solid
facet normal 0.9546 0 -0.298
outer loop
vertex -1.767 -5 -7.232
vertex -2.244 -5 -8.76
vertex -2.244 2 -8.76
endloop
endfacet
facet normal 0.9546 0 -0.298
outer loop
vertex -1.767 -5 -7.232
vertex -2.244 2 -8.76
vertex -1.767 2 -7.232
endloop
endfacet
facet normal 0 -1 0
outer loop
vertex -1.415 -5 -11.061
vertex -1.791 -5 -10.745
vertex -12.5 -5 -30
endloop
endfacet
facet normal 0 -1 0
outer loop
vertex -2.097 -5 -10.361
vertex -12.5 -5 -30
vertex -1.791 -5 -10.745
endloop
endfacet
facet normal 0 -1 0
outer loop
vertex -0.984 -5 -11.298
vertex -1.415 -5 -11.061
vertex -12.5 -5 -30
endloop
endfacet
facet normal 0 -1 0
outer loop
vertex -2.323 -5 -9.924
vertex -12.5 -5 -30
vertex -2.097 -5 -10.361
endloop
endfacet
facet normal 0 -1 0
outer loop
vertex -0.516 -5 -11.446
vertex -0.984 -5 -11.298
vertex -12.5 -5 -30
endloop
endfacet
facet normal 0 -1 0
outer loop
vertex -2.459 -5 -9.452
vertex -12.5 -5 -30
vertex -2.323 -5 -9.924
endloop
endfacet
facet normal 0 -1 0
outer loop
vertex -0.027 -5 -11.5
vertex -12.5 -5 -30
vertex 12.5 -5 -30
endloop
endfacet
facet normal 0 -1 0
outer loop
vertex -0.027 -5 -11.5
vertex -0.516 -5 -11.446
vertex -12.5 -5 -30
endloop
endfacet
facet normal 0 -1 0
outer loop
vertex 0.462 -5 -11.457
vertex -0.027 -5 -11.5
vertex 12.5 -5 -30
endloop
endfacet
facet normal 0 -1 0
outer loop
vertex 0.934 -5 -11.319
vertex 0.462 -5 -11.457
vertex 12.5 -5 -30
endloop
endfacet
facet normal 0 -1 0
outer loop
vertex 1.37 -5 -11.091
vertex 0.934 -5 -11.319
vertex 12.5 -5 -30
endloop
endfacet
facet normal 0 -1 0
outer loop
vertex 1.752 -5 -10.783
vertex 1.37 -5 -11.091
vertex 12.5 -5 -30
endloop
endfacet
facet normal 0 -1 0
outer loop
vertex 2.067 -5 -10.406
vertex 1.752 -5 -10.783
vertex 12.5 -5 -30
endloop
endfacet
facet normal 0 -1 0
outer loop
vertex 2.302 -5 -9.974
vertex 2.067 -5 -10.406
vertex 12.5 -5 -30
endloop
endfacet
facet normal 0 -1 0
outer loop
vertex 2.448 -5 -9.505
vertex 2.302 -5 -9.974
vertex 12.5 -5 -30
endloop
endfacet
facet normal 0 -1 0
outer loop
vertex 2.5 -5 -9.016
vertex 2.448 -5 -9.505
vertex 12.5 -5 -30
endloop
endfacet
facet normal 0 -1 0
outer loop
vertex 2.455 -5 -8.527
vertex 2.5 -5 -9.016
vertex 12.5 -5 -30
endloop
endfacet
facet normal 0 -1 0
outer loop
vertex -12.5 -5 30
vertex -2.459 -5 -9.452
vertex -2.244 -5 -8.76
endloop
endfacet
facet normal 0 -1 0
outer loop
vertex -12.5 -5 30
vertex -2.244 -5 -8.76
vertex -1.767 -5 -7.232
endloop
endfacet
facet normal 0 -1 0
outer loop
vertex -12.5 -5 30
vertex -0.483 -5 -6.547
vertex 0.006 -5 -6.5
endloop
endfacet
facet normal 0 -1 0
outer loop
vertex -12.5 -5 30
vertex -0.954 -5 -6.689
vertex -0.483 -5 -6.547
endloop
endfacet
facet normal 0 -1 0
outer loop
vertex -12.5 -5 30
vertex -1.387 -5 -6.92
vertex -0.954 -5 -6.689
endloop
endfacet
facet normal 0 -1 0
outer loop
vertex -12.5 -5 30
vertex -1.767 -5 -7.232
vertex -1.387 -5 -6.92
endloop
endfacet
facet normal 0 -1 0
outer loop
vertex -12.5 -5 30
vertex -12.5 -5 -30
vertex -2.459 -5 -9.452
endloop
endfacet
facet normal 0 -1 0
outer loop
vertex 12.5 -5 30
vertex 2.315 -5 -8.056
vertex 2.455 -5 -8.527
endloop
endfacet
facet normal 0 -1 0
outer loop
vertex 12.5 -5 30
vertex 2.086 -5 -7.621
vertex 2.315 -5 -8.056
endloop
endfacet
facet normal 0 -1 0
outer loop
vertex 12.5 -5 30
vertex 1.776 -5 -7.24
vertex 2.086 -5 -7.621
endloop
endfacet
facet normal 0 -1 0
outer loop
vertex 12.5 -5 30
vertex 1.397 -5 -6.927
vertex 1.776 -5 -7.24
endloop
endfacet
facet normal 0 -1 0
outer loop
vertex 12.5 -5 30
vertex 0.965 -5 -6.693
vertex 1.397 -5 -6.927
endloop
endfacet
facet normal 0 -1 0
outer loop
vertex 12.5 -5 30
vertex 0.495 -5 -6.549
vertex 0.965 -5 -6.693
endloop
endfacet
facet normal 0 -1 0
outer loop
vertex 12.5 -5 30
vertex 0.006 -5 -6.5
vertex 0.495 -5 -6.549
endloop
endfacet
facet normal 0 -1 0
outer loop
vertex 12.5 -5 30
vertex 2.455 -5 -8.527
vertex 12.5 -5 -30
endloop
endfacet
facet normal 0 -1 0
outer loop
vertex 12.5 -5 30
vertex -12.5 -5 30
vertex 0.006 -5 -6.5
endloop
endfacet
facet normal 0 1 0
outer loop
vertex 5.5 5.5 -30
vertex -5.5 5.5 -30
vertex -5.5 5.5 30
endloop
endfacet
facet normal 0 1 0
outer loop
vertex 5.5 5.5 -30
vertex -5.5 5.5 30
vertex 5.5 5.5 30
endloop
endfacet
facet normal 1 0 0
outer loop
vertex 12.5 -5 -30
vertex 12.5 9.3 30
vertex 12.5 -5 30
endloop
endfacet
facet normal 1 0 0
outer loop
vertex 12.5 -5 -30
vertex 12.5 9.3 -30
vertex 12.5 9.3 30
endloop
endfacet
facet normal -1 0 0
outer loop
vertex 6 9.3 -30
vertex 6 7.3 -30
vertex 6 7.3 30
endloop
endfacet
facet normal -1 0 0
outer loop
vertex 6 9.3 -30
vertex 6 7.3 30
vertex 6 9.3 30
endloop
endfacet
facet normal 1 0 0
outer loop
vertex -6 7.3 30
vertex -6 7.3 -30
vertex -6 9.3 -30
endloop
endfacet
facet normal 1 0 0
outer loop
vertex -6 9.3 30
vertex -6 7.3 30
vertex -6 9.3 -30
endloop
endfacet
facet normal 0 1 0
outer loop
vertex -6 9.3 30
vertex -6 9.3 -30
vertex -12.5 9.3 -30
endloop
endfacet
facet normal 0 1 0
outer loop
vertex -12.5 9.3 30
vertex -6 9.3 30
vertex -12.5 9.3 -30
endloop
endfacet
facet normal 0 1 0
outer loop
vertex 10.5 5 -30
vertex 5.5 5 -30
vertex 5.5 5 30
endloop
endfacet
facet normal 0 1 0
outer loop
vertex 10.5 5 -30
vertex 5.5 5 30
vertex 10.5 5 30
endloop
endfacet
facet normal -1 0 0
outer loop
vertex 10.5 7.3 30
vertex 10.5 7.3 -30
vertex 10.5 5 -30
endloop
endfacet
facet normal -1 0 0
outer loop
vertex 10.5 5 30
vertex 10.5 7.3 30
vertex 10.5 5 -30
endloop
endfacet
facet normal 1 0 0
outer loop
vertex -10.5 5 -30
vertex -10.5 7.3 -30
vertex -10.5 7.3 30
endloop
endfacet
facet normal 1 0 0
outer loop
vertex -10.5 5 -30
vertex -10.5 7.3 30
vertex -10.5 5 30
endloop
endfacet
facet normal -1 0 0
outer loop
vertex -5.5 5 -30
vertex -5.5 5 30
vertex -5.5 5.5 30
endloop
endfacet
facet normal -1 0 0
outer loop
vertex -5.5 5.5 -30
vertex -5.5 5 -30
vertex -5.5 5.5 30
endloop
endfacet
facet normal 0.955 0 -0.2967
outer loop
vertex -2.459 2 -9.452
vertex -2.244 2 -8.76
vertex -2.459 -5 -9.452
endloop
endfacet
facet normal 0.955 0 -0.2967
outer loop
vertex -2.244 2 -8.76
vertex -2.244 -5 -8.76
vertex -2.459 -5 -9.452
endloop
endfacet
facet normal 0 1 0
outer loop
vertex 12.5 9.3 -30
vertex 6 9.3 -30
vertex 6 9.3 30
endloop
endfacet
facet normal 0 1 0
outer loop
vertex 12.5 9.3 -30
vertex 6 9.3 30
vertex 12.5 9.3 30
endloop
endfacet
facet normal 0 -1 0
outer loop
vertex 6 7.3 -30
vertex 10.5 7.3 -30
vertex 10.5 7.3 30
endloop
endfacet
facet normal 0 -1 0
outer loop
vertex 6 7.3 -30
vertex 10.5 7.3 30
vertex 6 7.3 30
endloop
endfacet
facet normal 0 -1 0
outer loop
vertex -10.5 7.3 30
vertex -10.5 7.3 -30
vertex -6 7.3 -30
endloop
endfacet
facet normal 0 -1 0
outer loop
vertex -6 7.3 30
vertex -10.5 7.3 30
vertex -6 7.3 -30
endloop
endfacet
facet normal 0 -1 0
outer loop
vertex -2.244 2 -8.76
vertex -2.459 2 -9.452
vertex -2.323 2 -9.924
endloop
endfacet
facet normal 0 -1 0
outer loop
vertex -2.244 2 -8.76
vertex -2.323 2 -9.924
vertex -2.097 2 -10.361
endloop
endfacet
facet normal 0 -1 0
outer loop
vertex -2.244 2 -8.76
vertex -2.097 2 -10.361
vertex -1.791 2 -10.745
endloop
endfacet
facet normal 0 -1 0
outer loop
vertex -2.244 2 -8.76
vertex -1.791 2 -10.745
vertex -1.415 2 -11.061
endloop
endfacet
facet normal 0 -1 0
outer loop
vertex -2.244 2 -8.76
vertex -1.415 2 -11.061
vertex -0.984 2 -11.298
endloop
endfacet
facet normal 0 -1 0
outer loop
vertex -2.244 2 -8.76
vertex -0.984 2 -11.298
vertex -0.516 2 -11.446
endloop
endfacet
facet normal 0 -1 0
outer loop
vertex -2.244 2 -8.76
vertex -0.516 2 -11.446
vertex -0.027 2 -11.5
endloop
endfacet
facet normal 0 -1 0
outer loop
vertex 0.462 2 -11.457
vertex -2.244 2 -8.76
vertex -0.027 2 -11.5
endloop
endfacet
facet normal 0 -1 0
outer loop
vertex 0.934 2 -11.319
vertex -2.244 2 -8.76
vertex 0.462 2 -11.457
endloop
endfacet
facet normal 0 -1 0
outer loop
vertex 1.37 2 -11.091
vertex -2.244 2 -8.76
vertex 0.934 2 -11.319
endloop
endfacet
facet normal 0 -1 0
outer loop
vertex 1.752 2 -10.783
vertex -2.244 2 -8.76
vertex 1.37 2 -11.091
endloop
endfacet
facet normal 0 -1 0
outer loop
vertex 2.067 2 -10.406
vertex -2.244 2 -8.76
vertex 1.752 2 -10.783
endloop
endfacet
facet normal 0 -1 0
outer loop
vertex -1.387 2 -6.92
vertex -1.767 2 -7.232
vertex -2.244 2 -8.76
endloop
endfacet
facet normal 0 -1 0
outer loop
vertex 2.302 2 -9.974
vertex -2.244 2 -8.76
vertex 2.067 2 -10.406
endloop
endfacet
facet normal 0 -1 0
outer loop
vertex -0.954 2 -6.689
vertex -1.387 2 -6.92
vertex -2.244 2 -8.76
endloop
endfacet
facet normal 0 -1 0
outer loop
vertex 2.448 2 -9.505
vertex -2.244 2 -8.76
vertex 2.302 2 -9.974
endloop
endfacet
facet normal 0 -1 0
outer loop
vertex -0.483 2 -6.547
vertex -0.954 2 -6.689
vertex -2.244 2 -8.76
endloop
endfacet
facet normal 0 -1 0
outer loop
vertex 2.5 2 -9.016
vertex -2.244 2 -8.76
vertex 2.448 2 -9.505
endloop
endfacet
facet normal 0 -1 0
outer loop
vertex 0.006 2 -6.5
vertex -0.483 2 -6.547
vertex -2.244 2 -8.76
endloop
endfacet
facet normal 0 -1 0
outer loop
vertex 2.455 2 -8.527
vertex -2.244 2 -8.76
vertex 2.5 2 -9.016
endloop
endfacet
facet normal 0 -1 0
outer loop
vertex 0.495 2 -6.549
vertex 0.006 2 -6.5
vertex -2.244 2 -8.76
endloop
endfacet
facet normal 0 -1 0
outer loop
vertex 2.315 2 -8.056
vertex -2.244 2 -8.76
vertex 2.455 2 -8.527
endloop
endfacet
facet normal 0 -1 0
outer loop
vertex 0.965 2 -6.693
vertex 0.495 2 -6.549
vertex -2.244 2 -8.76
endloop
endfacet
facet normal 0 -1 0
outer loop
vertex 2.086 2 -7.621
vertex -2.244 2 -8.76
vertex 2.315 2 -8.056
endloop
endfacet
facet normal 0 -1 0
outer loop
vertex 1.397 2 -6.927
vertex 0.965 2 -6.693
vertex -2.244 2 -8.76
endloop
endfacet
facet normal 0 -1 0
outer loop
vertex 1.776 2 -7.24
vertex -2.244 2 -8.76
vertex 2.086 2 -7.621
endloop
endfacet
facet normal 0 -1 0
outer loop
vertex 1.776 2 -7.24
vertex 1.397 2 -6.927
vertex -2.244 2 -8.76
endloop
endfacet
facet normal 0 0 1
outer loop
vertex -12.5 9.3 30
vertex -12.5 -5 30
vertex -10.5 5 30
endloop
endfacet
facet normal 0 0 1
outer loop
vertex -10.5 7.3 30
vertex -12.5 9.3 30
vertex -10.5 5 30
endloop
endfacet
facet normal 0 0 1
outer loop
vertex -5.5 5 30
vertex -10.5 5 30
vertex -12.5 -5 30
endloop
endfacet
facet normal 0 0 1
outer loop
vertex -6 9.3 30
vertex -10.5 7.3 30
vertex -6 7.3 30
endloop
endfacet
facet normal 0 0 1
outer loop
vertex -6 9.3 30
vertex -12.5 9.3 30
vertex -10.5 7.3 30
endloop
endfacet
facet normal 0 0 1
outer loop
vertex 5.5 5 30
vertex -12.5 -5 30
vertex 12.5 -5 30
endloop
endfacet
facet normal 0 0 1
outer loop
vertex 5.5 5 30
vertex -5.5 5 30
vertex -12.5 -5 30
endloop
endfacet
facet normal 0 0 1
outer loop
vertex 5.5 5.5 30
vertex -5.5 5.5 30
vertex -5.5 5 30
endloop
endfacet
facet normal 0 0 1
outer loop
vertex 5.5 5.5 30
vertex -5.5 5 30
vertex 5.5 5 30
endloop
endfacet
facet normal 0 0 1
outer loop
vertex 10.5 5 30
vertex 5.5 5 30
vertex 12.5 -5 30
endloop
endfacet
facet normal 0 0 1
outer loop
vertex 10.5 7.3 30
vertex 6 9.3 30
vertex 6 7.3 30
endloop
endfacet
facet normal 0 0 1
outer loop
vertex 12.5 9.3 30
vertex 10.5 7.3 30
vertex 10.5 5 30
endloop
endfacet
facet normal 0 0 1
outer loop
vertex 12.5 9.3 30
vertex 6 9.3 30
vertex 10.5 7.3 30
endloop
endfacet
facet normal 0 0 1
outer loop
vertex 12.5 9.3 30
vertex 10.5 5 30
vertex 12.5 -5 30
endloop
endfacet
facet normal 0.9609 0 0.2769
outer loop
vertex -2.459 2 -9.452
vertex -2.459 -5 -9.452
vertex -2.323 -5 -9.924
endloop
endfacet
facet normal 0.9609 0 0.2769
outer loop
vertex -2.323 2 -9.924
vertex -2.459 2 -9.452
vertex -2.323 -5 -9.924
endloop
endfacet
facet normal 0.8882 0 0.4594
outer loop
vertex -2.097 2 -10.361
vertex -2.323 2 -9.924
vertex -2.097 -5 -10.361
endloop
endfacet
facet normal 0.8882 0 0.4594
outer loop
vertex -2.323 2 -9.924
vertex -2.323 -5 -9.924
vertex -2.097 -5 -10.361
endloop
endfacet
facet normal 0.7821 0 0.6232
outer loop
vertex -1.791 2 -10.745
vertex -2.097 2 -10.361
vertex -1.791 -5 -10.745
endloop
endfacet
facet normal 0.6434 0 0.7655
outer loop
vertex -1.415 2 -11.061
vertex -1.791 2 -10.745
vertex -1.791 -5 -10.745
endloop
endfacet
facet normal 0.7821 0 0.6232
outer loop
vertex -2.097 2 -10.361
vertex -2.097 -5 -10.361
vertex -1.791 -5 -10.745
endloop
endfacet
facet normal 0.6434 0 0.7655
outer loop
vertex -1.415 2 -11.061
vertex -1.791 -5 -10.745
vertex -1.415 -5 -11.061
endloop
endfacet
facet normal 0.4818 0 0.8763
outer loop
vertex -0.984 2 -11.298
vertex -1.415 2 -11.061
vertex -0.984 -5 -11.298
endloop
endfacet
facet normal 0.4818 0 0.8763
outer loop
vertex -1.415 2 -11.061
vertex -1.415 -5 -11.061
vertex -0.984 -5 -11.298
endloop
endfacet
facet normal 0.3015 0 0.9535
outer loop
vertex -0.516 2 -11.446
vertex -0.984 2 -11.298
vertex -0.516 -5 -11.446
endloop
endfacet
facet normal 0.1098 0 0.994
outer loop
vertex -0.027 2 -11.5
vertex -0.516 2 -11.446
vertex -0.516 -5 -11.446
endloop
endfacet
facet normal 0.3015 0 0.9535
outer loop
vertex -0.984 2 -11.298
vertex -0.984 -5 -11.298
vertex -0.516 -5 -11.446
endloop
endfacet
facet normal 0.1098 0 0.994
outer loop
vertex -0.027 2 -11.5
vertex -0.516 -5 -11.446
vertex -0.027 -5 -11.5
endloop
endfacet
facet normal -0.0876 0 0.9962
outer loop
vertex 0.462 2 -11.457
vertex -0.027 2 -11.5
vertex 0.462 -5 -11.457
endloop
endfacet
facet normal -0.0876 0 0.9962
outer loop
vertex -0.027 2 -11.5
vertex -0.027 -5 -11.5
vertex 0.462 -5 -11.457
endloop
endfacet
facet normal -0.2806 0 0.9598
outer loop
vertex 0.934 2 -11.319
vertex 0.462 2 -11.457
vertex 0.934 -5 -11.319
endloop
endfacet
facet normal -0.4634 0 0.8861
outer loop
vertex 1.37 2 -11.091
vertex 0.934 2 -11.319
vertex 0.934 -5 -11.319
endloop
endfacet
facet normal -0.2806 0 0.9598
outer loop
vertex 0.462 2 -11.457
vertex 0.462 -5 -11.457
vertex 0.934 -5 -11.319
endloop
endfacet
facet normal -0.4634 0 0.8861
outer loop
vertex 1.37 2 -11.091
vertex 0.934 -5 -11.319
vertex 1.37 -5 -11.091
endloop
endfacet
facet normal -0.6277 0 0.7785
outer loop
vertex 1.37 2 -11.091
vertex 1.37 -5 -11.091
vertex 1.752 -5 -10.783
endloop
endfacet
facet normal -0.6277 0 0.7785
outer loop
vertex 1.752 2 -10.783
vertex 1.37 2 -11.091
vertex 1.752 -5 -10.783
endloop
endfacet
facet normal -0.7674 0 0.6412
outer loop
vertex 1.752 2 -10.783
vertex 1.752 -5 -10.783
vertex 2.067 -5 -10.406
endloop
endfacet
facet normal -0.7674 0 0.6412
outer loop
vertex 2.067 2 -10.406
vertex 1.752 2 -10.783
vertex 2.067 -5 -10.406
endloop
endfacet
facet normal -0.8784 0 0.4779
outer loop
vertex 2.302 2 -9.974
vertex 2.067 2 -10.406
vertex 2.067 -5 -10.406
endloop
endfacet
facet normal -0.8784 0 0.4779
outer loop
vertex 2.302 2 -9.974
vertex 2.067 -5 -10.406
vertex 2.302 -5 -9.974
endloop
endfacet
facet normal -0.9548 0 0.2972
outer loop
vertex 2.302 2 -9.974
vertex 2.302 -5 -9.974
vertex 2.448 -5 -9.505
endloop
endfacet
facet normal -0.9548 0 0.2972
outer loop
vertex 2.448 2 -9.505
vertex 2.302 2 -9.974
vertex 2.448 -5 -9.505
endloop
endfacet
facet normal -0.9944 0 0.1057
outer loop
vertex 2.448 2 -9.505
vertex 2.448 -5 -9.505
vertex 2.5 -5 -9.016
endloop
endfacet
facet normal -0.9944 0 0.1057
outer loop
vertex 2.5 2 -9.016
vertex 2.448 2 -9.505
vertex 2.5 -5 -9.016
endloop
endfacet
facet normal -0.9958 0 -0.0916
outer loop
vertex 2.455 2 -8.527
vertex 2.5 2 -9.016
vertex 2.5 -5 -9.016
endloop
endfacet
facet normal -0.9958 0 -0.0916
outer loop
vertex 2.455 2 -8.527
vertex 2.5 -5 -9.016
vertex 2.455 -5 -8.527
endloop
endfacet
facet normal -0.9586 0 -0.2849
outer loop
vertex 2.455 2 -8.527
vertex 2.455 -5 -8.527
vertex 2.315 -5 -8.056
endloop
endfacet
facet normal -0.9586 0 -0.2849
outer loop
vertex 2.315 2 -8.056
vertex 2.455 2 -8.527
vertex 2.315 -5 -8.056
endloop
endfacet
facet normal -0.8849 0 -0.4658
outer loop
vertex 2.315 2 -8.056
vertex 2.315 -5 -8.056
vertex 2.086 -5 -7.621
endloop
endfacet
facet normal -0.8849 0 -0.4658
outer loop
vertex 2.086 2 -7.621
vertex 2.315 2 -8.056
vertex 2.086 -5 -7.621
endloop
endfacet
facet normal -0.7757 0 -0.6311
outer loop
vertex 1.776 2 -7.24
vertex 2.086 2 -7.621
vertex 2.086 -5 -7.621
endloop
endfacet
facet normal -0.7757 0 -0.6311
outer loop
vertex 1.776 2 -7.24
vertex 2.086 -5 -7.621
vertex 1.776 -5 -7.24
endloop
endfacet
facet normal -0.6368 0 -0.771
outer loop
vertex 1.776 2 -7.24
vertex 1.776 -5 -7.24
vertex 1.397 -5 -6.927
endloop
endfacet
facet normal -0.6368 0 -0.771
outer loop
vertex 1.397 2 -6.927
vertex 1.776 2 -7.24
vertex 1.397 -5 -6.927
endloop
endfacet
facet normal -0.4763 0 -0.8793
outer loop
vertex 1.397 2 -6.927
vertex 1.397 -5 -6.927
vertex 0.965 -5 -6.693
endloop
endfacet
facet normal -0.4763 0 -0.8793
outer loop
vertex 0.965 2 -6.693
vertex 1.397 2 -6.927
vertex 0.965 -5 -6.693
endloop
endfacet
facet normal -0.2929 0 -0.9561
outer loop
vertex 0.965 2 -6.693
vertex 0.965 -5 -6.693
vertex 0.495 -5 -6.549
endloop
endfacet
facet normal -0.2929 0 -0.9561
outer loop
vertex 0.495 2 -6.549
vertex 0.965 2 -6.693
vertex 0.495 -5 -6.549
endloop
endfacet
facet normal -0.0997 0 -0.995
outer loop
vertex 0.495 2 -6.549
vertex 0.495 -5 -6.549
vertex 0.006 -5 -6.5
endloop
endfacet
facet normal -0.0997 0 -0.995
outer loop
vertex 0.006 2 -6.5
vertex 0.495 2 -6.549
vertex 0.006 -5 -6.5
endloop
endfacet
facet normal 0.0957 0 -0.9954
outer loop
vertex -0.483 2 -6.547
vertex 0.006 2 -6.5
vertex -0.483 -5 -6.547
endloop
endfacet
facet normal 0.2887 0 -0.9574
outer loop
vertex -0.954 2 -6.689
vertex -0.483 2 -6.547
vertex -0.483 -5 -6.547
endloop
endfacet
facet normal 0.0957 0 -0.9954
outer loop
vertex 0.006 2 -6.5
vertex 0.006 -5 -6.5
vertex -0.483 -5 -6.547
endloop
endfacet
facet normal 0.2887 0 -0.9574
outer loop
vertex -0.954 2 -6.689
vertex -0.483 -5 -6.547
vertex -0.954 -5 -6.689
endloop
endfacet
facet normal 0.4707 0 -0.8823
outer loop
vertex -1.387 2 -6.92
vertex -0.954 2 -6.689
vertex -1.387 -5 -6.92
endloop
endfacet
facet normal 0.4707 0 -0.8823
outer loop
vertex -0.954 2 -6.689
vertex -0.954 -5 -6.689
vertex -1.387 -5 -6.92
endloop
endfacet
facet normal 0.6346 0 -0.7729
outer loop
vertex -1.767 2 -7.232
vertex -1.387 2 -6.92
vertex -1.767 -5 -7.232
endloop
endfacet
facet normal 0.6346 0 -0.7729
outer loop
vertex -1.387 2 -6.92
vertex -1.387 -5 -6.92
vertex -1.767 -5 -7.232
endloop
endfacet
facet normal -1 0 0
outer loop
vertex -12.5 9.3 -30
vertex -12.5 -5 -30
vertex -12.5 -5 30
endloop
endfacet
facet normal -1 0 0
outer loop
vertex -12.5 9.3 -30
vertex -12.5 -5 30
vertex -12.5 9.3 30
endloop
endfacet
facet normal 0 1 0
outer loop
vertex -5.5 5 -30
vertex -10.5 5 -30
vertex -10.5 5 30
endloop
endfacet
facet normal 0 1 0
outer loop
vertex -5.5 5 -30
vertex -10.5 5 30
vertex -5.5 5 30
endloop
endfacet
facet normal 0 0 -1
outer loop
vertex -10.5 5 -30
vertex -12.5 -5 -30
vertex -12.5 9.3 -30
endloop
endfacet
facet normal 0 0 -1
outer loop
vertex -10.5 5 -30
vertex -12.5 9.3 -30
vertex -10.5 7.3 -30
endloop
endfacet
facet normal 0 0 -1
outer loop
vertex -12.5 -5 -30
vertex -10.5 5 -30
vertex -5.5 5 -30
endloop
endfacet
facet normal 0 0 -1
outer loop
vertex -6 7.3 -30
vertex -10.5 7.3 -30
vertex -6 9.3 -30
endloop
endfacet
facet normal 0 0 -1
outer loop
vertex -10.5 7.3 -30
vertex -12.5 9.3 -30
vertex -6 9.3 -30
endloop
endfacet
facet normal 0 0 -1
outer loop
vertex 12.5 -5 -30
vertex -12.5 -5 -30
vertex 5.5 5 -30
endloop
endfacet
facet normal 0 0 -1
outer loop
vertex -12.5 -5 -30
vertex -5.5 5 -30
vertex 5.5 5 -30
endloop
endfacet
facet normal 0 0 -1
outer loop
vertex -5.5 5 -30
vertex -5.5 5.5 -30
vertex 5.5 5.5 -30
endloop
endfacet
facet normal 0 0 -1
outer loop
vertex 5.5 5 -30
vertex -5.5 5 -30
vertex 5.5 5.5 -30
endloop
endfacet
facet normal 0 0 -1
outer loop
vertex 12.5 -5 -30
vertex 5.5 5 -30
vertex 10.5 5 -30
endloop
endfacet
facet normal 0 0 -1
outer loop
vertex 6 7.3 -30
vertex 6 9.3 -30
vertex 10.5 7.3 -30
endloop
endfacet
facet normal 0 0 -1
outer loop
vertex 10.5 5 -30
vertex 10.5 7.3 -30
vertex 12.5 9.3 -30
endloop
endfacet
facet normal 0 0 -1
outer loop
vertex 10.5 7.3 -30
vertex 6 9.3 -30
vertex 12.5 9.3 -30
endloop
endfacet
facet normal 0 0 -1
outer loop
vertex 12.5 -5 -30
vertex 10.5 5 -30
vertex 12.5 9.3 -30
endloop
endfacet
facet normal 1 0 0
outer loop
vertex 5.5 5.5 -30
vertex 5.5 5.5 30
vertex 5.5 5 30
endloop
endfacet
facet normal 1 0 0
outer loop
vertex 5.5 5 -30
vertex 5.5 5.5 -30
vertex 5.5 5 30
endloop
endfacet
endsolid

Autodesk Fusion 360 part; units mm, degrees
sketch "Sketch1" plane through (0, 0, 0) normal (0, 0, 1) x (1, 0, 0)
  line L0 (12.5, -5) -> (-12.5, -5)
  line L1 (-12.5, -5) -> (-12.5, 5)
  line L2 (12.5, 5) -> (12.5, -5)
  line L3 (12.5, -5) -> (-12.5, 5) construction
  line L4 (-12.5, -5) -> (12.5, 5) construction
  line L5 (12.5, 5) -> (12.5, 7.3)
  line L6 (10.5, 7.3) -> (10.5, 5)
  line L7 (-5.5, 5.5) -> (5.5, 5.5)
  line L8 (5.5, 5.5) -> (5.5, 5)
  line L9 (-5.5, 5) -> (-5.5, 5.5)
  line L10 (6, 9.3) -> (12.5, 9.3)
  line L11 (12.5, 9.3) -> (12.5, 7.3)
  line L12 (10.5, 7.3) -> (6, 7.3)
  line L13 (6, 7.3) -> (6, 9.3)
  line L14 (-10.5, 5) -> (-5.5, 5)
  line L15 (5.5, 5) -> (10.5, 5)
  line L16 (0, 5.5) -> (0, -5) construction
  line L17 (-6, 7.3) -> (-6, 9.3)
  line L18 (-12.5, 9.3) -> (-12.5, 7.3)
  line L19 (-10.5, 7.3) -> (-10.5, 5)
  line L20 (-12.5, 5) -> (-12.5, 7.3)
  line L21 (-10.5, 7.3) -> (-6, 7.3)
  line L22 (-6, 9.3) -> (-12.5, 9.3)
  dimension "d3" = 25
  dimension "d5" = 10
  dimension "d11" = 11
  dimension "d13" = 0.5
  dimension "d14" = 2.3
  dimension "d17" = 6.5
  dimension "d18" = 2
extrude "Extrude1" add sketch "Sketch1" along normal blind 30 and the other way blind 30
sketch "Sketch2" plane through (0, -5, 0) normal (0, -1, 0) x (1, 0, 0)
  line L0 (12.5, -30) -> (12.5, 30)
  line L1 (12.5, 30) -> (-12.5, 30)
  line L2 (-12.5, 30) -> (-12.5, -30)
  line L3 (-12.5, -30) -> (12.5, -30)
  circle A0 centre (0, 20) radius 9
  line L4 (0, 30) -> (0, 0) construction
  dimension "d23" = 18
extrude "Extrude2" cut sketch "Sketch2" against normal blind 5 contours A0
sketch "Sketch3" plane through (0, -5, 0) normal (0, -1, 0) x (1, 0, 0)
  circle A0 centre (0, 20) radius 9
  line L0 (12.5, -30) -> (12.5, 30)
  line L1 (12.5, 30) -> (-12.5, 30)
  line L2 (-12.5, 30) -> (-12.5, -30)
  line L3 (-12.5, -30) -> (12.5, -30)
  line L4 (0, 11) -> (0, -9) construction
  line L5 (2.3874, -9.7418) -> (8, -9.7418) construction
  line L6 (-2.2435, -8.7604) -> (-1.7674, -7.2318)
  line L7 (-2.2435, -8.7604) -> (-2.4588, -9.4519)
  arc A1 (-2.4588, -9.4519) -> (-1.7674, -7.2318) centre (0, -9) ccw
  point P0 (-9, 20)
  dimension "d26" = 5
extrude "Extrude3" cut sketch "Sketch3" against normal blind 7 contours L6 L7 A1
extrude "Extrude4" add 1 faces at (1.8705, 0, 22.3455) along direction (0, -1, 0) blind 5
